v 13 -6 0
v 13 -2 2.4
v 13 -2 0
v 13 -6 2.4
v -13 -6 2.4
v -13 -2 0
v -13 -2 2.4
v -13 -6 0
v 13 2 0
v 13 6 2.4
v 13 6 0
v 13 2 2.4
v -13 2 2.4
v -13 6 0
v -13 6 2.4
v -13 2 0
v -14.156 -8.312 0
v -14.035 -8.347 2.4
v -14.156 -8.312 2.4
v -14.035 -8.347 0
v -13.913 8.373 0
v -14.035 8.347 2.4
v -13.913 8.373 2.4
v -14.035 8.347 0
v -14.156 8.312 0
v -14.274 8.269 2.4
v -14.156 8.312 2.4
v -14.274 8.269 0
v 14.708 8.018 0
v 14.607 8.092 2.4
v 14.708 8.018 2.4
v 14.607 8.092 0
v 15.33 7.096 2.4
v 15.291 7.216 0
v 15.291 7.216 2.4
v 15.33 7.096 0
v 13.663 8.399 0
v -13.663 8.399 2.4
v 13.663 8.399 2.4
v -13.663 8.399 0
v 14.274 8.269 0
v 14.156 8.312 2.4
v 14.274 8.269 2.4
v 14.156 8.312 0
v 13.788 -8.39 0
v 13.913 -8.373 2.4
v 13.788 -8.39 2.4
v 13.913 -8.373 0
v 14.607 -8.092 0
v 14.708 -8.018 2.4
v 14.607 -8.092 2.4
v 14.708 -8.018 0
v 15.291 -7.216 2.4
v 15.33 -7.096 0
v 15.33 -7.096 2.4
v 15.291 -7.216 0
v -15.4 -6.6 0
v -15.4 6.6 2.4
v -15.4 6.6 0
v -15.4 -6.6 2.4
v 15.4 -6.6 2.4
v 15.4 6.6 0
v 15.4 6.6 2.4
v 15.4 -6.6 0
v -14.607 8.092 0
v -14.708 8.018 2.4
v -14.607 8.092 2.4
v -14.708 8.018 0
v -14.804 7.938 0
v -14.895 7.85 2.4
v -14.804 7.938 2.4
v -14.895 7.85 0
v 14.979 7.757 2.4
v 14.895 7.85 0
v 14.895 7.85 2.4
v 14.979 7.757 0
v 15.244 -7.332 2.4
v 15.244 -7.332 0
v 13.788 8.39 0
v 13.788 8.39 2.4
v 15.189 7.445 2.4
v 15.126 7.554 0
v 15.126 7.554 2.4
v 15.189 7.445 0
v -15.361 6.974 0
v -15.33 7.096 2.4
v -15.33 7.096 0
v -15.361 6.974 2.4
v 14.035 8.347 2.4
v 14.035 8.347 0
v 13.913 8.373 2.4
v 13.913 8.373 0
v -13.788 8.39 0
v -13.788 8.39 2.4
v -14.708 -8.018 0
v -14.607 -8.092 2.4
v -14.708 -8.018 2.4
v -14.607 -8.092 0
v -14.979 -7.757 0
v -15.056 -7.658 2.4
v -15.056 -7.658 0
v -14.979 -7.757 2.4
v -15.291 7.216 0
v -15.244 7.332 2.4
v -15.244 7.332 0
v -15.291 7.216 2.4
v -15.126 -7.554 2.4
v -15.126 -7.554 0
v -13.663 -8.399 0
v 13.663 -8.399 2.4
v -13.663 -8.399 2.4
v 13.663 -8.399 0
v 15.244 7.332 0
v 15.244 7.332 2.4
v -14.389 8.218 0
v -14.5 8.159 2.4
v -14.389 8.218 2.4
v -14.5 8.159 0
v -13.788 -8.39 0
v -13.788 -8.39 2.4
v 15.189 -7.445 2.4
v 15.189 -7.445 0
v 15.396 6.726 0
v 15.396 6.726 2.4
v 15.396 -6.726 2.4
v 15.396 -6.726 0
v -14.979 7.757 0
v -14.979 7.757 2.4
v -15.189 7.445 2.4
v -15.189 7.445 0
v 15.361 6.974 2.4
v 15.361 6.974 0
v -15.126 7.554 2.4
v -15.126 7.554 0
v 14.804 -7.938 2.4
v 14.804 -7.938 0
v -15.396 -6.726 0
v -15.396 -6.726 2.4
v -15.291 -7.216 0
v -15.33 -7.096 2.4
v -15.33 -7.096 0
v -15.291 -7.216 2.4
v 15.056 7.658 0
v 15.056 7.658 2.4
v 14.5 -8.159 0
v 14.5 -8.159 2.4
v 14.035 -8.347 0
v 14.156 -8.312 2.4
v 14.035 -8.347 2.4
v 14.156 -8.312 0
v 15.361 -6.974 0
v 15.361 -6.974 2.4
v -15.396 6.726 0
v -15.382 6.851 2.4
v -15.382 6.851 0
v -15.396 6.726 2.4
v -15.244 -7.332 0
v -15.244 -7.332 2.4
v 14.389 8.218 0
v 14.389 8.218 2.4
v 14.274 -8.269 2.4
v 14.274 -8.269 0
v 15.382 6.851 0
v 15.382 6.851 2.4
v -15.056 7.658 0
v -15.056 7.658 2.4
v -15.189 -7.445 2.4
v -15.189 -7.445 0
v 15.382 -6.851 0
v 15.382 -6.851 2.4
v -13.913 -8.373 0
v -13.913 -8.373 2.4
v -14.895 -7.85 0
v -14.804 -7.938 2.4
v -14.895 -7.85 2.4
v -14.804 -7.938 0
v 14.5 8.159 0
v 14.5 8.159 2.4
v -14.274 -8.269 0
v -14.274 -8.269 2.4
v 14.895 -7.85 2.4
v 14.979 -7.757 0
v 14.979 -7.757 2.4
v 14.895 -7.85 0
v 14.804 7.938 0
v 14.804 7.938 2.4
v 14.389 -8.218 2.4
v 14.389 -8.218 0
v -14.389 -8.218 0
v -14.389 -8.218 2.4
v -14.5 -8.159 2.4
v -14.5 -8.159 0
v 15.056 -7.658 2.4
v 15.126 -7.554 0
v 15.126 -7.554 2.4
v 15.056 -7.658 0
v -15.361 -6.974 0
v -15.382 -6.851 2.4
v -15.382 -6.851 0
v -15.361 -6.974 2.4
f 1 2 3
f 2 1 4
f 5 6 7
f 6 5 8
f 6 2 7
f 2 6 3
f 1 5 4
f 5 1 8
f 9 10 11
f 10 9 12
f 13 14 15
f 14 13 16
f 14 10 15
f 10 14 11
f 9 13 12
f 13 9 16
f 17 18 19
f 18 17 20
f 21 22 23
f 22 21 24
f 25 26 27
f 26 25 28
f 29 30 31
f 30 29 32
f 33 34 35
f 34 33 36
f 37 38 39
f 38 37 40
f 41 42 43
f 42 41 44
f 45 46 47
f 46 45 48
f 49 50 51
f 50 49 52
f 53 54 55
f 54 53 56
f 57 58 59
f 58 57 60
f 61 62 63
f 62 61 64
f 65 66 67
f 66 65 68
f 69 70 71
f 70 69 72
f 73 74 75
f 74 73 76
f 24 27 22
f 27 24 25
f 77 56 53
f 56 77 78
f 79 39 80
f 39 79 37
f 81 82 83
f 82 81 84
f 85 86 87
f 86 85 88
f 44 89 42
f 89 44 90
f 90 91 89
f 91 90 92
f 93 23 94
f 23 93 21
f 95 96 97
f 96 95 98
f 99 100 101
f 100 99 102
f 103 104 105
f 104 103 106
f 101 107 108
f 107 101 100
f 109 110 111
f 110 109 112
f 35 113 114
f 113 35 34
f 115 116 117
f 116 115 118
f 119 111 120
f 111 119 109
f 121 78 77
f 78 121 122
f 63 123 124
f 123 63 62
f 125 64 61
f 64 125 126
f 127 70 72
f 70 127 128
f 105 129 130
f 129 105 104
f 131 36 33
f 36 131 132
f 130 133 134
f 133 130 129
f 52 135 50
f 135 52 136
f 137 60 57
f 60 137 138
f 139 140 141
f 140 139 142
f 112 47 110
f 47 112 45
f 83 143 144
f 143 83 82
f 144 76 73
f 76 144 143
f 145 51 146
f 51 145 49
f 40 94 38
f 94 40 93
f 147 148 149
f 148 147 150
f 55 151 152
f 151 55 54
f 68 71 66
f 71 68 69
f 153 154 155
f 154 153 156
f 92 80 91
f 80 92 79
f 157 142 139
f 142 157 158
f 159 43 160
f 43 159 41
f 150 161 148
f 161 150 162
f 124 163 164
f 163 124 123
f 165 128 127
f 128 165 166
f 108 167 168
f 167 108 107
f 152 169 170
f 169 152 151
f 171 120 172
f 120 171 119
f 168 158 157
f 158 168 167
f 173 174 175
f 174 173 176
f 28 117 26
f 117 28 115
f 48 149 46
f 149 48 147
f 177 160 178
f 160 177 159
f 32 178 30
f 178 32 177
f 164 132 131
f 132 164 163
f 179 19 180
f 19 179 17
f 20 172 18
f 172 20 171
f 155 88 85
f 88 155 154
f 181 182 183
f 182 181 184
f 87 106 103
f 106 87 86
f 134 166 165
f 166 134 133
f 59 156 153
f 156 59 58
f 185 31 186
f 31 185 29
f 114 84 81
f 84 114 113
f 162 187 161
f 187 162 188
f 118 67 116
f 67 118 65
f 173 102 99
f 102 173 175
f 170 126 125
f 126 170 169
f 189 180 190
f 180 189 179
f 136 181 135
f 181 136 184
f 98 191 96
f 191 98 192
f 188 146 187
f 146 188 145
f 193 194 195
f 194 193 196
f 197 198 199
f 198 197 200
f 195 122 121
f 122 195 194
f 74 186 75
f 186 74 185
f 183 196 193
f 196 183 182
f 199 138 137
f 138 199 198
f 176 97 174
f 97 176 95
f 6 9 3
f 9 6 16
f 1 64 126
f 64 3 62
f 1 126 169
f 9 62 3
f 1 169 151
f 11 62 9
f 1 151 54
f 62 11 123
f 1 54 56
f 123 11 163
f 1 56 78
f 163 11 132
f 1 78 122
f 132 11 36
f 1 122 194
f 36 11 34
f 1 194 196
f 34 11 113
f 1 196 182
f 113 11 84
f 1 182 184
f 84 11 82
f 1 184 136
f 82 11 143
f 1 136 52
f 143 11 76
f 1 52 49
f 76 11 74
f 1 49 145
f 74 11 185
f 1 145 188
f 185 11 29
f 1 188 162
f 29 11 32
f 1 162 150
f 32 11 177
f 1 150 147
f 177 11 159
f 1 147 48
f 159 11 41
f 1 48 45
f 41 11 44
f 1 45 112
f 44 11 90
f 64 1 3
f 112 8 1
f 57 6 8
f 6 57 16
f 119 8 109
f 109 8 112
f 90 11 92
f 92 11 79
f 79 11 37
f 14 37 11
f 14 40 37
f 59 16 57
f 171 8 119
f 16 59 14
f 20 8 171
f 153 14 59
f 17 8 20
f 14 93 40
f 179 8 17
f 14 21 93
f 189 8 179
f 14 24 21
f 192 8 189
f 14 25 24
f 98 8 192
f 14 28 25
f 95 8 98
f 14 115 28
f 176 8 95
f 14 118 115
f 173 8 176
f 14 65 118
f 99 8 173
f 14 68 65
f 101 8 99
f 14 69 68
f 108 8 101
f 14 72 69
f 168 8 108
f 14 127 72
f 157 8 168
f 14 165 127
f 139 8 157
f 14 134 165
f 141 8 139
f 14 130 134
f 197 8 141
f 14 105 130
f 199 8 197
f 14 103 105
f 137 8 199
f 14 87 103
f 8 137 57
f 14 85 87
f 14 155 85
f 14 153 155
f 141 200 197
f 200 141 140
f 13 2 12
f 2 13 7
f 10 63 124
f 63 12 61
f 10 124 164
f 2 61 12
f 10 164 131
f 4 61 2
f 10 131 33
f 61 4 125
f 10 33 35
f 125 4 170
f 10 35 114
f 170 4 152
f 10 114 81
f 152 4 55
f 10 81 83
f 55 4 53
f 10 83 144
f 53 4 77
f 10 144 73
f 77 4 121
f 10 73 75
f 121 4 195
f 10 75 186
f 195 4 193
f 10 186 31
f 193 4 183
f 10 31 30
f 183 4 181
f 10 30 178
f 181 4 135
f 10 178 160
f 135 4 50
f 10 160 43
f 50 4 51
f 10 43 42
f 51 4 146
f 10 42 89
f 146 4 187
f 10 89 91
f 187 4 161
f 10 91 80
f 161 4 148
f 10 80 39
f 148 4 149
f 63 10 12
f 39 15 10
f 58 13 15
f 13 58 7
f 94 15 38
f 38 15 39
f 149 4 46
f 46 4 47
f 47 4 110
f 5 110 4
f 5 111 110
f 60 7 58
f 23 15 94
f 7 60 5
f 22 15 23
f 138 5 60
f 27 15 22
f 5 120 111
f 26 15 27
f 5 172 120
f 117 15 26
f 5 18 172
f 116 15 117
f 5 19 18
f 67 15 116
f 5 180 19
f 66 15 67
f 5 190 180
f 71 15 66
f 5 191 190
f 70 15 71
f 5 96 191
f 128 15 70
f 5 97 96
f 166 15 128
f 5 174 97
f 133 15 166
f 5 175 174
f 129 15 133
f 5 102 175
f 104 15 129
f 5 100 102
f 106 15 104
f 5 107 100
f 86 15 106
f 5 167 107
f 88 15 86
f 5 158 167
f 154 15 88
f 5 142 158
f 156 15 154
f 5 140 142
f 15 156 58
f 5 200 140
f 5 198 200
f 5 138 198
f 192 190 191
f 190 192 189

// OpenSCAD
//=== Flat Tri Glide ===//

//width of the webbing opening (1in = 25.4 mm)
_1_webbingWidth = 26;

// width of the gap for the webbing
_2_webbingGap = 4;

// thickness of the edge
_3_edgeThickness = 2.4;

// thickness of the center beam
_4_centerThickness = 4;

// height of the tri glide
_5_height = 2.4;

// percent corner rounding
_6_cornerRounding = 75; // [1:100]


module makeBody(xsize, ysize, height, radius) {
	translate([0,0,height/2]) {
		minkowski() {
			cube(size=[xsize-2*radius,ysize-2*radius, height/2], center = true);
			cylinder(r=radius, h=height/2, center=true);
		}
	}
}

module makeCuts(width, gap, thickness, height) {
	offset = (thickness+gap)/2;
	for (y = [-offset, offset]) {
		translate([0, y, height/2]) {
			cube(size=[width, gap, height*2], center=true);
		}
	}
}

module makeTriGlide(width, gap, edgeThickness, centerThickness, height, rounding, $fn=90) {
	xsize = width + edgeThickness * 2;
	ysize = centerThickness + edgeThickness * 2 + gap * 2;
	radius = edgeThickness*(rounding/100);
	difference() {
		makeBody(xsize, ysize, height, radius);
		makeCuts(width, gap, centerThickness, height);
	}
}

makeTriGlide(_1_webbingWidth, _2_webbingGap, _3_edgeThickness, _4_centerThickness, _5_height, _6_cornerRounding);
